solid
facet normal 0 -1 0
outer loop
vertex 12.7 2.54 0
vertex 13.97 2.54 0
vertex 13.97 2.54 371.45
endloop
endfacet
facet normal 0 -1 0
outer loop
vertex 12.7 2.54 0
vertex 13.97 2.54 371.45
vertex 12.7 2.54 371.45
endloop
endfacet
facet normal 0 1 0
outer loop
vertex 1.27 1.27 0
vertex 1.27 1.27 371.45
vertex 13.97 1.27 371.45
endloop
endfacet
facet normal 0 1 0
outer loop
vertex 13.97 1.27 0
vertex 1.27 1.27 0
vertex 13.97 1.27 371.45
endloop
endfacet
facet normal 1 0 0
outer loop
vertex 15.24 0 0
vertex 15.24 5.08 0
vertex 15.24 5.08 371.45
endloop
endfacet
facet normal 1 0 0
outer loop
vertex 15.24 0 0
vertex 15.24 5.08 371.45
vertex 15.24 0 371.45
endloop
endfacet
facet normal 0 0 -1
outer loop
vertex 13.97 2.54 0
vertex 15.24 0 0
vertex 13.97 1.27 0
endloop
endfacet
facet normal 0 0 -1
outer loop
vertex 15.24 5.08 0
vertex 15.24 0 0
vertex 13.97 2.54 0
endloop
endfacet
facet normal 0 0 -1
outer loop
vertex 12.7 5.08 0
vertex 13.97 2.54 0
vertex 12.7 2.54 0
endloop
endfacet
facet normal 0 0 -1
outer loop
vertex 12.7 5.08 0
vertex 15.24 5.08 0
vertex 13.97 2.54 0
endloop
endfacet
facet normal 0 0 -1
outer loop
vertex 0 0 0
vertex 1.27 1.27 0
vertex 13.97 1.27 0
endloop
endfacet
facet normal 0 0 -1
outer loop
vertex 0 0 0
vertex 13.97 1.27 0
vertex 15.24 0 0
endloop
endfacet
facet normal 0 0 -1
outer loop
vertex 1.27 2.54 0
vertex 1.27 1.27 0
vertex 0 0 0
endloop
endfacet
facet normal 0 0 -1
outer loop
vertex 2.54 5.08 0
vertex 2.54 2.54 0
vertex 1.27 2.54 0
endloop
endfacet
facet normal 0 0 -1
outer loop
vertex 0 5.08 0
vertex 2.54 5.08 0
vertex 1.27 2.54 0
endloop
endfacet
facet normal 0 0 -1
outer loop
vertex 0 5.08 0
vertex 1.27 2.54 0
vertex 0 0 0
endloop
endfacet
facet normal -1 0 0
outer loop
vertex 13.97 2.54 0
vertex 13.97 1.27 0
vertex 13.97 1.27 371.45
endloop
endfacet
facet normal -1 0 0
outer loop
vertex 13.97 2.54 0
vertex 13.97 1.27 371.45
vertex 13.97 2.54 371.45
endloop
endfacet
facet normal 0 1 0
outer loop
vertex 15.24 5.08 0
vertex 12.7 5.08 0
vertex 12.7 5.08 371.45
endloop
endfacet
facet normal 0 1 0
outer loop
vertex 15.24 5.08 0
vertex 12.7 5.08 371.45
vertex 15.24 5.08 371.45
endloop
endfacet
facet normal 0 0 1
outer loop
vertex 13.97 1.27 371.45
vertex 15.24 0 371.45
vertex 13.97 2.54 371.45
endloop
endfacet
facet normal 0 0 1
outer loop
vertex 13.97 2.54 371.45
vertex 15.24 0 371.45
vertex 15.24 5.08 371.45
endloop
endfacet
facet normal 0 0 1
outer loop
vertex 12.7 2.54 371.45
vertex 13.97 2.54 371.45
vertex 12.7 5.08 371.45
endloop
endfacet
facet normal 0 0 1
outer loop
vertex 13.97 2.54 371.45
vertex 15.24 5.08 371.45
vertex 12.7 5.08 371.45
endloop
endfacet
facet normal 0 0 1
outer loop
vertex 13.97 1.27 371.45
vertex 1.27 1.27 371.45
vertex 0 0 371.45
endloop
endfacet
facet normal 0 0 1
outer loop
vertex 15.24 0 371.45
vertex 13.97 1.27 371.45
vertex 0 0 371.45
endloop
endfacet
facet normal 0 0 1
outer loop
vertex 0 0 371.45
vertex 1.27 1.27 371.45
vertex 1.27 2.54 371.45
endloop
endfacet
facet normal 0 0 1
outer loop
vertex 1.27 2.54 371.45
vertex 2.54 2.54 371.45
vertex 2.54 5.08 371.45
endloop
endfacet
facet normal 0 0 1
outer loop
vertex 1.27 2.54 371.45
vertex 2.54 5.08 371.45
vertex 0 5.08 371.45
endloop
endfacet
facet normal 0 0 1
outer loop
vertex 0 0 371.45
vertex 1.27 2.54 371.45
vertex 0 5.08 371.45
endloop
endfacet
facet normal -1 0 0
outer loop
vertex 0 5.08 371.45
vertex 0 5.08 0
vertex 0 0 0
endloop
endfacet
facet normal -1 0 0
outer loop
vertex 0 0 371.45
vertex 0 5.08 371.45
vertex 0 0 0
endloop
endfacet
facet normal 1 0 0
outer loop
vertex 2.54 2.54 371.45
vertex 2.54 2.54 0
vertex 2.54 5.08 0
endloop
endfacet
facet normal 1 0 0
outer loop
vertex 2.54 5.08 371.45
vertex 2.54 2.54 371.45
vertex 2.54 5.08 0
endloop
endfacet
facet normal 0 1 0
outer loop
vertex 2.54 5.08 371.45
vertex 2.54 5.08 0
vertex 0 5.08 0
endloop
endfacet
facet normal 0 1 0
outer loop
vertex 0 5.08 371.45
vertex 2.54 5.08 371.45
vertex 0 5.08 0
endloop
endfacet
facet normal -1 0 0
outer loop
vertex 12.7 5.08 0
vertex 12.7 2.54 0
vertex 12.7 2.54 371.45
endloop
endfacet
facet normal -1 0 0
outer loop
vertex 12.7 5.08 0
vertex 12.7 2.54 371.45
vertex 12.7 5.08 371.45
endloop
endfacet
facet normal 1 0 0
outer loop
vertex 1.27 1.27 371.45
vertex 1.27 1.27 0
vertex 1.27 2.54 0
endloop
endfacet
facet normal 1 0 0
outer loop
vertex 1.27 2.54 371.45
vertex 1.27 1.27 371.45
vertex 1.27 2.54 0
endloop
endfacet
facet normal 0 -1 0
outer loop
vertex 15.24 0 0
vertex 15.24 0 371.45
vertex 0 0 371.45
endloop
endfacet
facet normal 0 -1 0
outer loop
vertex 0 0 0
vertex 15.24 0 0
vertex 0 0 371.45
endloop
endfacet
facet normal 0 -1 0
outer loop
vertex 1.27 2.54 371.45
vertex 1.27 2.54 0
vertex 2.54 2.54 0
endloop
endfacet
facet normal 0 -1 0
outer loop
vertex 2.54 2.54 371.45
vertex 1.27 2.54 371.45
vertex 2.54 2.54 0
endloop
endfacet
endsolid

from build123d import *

# Parameters (mm, degrees)
F1_DEPTH = 371.4496


with BuildPart() as f1:
    # F0 (on Top) → F1 (new body)
    with BuildSketch(Plane.XY):
        Polygon((0, 5.08), (0, 0), (7.62, 0), (7.62, 1.27), (1.27, 1.27), (1.27, 2.54), (2.54, 2.54), (2.54, 5.08), align=None)
    extrude(amount=F1_DEPTH)

    # F2: F1 across face


with BuildPart() as f1_1:
    add(f1.part)
    add(f1.part.mirror(Plane(origin=(7.62, 0.635, 185.7248), x_dir=(0, 1, 0), z_dir=(1, 0, 0))))


solid = f1_1.part
